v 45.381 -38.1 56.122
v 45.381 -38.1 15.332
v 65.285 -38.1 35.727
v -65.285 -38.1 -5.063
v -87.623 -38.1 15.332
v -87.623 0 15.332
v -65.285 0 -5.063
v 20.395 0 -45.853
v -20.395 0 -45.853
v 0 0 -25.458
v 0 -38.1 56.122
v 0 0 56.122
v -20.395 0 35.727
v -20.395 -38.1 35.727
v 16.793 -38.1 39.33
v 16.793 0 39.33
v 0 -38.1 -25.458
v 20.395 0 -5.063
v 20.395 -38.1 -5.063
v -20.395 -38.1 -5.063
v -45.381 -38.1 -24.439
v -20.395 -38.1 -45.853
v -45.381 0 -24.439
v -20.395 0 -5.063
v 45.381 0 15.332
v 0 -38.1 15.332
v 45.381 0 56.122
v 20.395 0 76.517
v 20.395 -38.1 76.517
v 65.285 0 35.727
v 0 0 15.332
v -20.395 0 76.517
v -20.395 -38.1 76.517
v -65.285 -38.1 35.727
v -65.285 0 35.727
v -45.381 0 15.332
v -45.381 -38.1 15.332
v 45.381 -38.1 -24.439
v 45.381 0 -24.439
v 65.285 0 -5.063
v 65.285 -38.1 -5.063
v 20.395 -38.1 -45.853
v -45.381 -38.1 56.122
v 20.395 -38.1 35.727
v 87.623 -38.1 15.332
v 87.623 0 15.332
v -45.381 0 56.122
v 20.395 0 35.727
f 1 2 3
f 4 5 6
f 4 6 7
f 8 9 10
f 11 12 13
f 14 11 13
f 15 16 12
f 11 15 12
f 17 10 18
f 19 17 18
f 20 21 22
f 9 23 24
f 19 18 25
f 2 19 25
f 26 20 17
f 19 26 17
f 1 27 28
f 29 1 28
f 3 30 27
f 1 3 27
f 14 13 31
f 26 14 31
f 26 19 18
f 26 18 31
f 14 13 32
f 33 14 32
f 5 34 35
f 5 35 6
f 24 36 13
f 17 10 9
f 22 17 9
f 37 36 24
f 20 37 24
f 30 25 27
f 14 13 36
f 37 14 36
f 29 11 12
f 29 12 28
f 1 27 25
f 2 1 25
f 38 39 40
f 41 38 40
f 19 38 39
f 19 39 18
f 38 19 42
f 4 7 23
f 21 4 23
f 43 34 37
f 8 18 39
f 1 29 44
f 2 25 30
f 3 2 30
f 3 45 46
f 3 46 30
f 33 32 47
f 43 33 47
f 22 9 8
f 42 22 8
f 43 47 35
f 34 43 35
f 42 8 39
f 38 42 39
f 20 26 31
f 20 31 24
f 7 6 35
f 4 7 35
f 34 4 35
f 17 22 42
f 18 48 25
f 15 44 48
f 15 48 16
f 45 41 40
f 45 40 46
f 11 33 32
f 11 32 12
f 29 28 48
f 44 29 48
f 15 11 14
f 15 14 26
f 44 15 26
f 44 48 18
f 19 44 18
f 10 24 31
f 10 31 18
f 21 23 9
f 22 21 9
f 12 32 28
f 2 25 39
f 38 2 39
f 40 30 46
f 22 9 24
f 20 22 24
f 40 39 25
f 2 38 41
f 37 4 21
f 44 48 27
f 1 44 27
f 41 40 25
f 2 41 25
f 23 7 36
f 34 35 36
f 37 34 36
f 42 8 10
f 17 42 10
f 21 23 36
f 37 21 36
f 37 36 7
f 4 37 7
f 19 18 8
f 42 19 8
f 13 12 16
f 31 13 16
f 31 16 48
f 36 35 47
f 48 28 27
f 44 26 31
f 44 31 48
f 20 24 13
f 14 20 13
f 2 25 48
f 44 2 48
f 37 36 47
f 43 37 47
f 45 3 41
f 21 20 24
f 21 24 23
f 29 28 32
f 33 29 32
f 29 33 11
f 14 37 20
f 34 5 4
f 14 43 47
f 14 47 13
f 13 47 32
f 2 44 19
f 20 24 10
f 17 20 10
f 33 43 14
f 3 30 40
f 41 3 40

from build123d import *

# Parameters (mm, degrees)
F1_DEPTH = 38.1


with BuildPart() as f1:
    # F0 (on Front) → F1 (new body)
    with BuildSketch(Plane.XZ):
        Polygon((-65.284781, -5.06266), (-65.284781, 35.72736), (-87.622546, 15.33235), align=None)
        Polygon((-45.381104, 15.33235), (-45.381104, 56.122369), (-65.284781, 35.72736), align=None)
        Polygon((-45.381104, -24.439445), (-45.381104, 15.33235), (-65.284781, -5.06266), align=None)
        Polygon((-20.39501, -45.852679), (-20.39501, -5.06266), (-45.381104, -24.439445), align=None)
        Polygon((-20.39501, -5.06266), (-20.39501, 35.72736), (-45.381104, 15.33235), align=None)
        Polygon((-20.39501, 35.72736), (-20.39501, 76.517379), (-45.381104, 56.122369), align=None)
        Polygon((20.39501, 76.517379), (-20.39501, 76.517379), (-3.602338, 59.724707), (0, 56.122369), align=None)
        Polygon((0, 56.122369), (-20.39501, 35.72736), (0, 15.33235), (20.39501, 35.72736), (16.792672, 39.329697), align=None)
        Polygon((15.33235, 0), (0, 15.33235), (-20.39501, -5.06266), (0, -25.457669), (20.39501, -5.06266), align=None)
        Polygon((20.39501, -45.852679), (0, -25.457669), (-20.39501, -45.852679), align=None)
        Polygon((45.381104, -24.439445), (20.39501, -5.06266), (20.39501, -45.852679), align=None)
        Polygon((45.381104, 15.33235), (20.39501, 35.72736), (20.39501, -5.06266), align=None)
        Polygon((45.381104, 56.122369), (20.39501, 76.517379), (20.39501, 35.72736), align=None)
        Polygon((65.284781, 35.72736), (45.381104, 56.122369), (45.381104, 15.33235), align=None)
        Polygon((65.284781, -5.06266), (45.381104, 15.33235), (45.381104, -24.439445), align=None)
        Polygon((87.622546, 15.33235), (65.284781, 35.72736), (65.284781, -5.06266), align=None)
    extrude(amount=F1_DEPTH)


solid = f1.part
